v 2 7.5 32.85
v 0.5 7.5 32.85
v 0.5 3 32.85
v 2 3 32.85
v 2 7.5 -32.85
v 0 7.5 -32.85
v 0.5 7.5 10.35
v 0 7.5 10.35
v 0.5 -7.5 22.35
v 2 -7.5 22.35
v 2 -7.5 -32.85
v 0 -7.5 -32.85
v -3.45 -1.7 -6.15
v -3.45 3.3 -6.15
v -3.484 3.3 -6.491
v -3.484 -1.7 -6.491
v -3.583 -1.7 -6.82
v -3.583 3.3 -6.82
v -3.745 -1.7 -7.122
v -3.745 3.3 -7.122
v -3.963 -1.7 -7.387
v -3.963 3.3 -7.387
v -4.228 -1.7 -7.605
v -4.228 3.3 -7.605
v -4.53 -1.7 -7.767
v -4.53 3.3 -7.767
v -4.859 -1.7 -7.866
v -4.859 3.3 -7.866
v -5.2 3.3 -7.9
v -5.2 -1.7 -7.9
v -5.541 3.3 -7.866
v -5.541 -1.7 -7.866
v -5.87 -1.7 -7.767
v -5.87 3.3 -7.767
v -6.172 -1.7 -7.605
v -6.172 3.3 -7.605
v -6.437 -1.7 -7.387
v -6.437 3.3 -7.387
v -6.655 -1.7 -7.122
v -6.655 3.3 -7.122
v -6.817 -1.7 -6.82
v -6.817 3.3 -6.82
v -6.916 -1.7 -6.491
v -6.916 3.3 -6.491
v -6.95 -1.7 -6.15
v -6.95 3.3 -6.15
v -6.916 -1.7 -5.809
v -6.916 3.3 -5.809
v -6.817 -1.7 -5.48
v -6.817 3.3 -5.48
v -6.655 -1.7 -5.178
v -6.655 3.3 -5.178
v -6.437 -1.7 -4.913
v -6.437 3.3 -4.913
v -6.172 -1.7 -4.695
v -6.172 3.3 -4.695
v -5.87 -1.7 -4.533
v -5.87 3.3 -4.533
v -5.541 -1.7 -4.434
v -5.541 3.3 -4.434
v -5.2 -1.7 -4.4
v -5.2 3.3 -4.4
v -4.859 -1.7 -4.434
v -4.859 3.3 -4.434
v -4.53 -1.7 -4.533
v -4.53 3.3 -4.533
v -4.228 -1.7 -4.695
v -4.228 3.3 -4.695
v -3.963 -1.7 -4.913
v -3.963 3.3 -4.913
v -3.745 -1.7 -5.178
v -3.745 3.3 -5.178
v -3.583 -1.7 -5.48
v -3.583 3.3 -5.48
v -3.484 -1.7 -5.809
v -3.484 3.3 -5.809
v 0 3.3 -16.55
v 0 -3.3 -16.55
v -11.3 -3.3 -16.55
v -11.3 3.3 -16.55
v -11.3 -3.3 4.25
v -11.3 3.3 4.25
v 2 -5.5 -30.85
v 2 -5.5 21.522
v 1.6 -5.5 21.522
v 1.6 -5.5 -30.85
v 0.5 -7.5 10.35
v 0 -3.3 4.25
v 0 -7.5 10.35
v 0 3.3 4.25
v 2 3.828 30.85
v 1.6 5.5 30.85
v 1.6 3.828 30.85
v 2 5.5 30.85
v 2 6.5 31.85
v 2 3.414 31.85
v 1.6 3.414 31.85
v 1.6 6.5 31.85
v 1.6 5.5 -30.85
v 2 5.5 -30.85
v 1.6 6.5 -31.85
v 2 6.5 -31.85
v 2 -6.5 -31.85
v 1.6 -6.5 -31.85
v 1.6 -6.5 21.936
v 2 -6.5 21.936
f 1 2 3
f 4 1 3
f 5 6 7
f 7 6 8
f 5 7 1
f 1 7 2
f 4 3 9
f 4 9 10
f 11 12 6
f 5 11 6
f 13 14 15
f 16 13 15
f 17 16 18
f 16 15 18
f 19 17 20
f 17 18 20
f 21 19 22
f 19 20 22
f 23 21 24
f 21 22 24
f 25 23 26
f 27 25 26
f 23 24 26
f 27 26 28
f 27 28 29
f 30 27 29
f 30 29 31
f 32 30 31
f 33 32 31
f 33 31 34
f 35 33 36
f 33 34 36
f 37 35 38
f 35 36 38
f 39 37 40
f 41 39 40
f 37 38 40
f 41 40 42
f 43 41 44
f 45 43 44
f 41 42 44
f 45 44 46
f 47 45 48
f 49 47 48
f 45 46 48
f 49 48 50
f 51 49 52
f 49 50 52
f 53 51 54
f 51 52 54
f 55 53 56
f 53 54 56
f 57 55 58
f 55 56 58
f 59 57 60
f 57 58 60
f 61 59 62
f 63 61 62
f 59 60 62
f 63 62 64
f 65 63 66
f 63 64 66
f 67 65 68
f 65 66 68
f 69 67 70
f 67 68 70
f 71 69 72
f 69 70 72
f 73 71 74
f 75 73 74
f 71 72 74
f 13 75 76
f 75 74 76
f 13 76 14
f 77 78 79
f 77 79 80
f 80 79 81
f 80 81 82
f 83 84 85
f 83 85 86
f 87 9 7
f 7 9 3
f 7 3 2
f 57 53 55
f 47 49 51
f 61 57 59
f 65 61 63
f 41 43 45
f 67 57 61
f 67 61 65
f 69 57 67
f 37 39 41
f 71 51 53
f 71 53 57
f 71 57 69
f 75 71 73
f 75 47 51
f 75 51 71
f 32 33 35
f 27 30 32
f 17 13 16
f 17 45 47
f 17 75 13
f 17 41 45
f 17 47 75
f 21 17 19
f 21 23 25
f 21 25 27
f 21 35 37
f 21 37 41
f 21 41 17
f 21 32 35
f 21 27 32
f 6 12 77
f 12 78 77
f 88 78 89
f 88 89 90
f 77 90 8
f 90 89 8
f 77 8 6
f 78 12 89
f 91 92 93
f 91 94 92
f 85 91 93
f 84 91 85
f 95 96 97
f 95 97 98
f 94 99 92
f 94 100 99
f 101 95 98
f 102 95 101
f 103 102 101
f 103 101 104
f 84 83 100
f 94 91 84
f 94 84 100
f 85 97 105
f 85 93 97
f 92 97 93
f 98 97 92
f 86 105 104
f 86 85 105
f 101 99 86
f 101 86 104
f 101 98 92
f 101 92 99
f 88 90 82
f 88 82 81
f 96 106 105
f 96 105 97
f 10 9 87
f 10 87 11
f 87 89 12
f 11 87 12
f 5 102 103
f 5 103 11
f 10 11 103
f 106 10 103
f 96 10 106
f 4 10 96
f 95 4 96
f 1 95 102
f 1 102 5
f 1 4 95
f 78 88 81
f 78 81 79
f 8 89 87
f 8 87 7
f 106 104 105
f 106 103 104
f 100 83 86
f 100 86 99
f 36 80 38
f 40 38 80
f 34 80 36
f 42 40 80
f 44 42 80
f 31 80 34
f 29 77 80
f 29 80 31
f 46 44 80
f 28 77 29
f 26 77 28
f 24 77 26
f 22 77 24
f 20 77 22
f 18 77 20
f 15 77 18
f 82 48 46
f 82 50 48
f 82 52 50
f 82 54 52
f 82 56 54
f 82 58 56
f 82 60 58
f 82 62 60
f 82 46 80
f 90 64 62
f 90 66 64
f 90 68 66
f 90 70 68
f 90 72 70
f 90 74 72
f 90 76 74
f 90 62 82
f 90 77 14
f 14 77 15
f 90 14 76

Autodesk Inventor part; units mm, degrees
ref_plane "YZ Plane" through (0, 0, 0) normal (1, 0, 0) x (0, 1, 0)
ref_plane "XZ Plane" through (0, 0, 0) normal (0, 1, 0) x (-1, 0, 0)
ref_plane "XY Plane" through (0, 0, 0) normal (0, 0, 1) x (1, 0, 0)
sketch "Эскиз1" plane through (0, 0, 0) normal (1, 0, 0) x (0, 1, 0)
  line L0 (-7.5, -32.85) -> (7.5, -32.85)
  line L1 (7.5, -32.85) -> (7.5, 32.85)
  line L2 (7.5, 32.85) -> (-7.5, 32.85)
  line L3 (-7.5, 32.85) -> (-7.5, -32.85)
  line L4 (-7.5, -32.85) -> (7.5, 32.85) construction
  line L5 (7.5, -32.85) -> (-7.5, 32.85) construction
  line L6 (0, -32.85) -> (0, -16.55) construction
  line L7 (3.3, 4.25) -> (-3.3, 4.25)
  line L8 (-3.3, 4.25) -> (-3.3, -16.55)
  line L9 (-3.3, -16.55) -> (3.3, -16.55)
  line L10 (3.3, -16.55) -> (3.3, 4.25)
  line L11 (7.5, 32.85) -> (-7.5, 32.85)
  line L12 (-7.5, 32.85) -> (-7.5, 10.35)
  line L13 (-7.5, 10.35) -> (7.5, 10.35)
  line L14 (7.5, 10.35) -> (7.5, 32.85)
  line L15 (0, -32.85) -> (-7.5, -12.2439)
  line L16 (0, -32.85) -> (21.9285, -32.85) construction
  point P0 (0, 0)
  point P1 (7.5, 10.35)
  dimension "d0" = 15
  dimension "d1" = 65.7
  dimension "d2" = 16.3
  dimension "d3" = 6.6
  dimension "d4" = 20.8
  dimension "d5" = 22.5
  dimension "d25" = 110
extrude "Выдавливание1" add sketch "Эскиз1" along normal blind 2 contours L3 L15 L0 | L15 L3 L13 L1 L0 | L3 L2 L1 L13 | L10 L9 L8 L7
extrude "Выдавливание2" add sketch "Эскиз1" against normal blind 11.3 contours L10 L9 L8 L7
extrude "Выдавливание3" cut sketch "Эскиз1" along normal blind 0.5 contours L3 L2 L1 L13
chamfer "Фаска2" distance 10.5 angle 45 1 edges at (1.25, -7.5, 32.85)
sketch "Эскиз2" plane through (2, 0, 0) normal (1, 0, 0) x (0, 0, -1)
  line L0 (-22.35, -7.5) -> (-32.85, 3) projected
  line L1 (-22.35, -7.5) -> (32.85, -7.5) projected
  line L2 (32.85, -7.5) -> (32.85, 7.5) projected
  line L3 (32.85, 7.5) -> (-32.85, 7.5) projected
  line L4 (-32.85, 7.5) -> (-32.85, 3) projected
  line L5 (31.85, -6.5) -> (-21.9358, -6.5)
  line L6 (-21.9358, -6.5) -> (-31.85, 3.4142)
  line L7 (-31.85, 3.4142) -> (-31.85, 6.5)
  line L8 (-31.85, 6.5) -> (31.85, 6.5)
  line L9 (31.85, 6.5) -> (31.85, -6.5)
  line L10 (-21.5216, -5.5) -> (30.85, -5.5)
  line L11 (30.85, -5.5) -> (30.85, 5.5)
  line L12 (30.85, 5.5) -> (-30.85, 5.5)
  line L13 (-30.85, 5.5) -> (-30.85, 3.8284)
  line L14 (-30.85, 3.8284) -> (-21.5216, -5.5)
  point P0 (0, 0)
  dimension "d27" = 1
  dimension "d33" = 1
extrude "Выдавливание5" cut sketch "Эскиз2" against normal blind 0.4 contours L5 L6 L7 L8 L9
sketch "Эскиз3" plane through (-11.3, 3.3, -16.55) normal (0, 1, 0) x (1, 0, 0)
  line L0 (0, 0) -> (0, -20.8) projected
  line L1 (0, 0) -> (6.1, 0) construction
  line L2 (6.1, 0) -> (6.1, -10.4) construction
  line L3 (6.1, -10.4) -> (0, -10.4) construction
  line L4 (0, -10.4) -> (0, 0) construction
  circle A0 centre (6.1, -10.4) radius 1.75
  point P0 (11.3, -16.55)
  dimension "d28" = 6.1
  dimension "d29" = 10.4
  dimension "d30" = 3.5
extrude "Выдавливание6" cut sketch "Эскиз3" against normal blind 5
properties part number "switch_cap"
